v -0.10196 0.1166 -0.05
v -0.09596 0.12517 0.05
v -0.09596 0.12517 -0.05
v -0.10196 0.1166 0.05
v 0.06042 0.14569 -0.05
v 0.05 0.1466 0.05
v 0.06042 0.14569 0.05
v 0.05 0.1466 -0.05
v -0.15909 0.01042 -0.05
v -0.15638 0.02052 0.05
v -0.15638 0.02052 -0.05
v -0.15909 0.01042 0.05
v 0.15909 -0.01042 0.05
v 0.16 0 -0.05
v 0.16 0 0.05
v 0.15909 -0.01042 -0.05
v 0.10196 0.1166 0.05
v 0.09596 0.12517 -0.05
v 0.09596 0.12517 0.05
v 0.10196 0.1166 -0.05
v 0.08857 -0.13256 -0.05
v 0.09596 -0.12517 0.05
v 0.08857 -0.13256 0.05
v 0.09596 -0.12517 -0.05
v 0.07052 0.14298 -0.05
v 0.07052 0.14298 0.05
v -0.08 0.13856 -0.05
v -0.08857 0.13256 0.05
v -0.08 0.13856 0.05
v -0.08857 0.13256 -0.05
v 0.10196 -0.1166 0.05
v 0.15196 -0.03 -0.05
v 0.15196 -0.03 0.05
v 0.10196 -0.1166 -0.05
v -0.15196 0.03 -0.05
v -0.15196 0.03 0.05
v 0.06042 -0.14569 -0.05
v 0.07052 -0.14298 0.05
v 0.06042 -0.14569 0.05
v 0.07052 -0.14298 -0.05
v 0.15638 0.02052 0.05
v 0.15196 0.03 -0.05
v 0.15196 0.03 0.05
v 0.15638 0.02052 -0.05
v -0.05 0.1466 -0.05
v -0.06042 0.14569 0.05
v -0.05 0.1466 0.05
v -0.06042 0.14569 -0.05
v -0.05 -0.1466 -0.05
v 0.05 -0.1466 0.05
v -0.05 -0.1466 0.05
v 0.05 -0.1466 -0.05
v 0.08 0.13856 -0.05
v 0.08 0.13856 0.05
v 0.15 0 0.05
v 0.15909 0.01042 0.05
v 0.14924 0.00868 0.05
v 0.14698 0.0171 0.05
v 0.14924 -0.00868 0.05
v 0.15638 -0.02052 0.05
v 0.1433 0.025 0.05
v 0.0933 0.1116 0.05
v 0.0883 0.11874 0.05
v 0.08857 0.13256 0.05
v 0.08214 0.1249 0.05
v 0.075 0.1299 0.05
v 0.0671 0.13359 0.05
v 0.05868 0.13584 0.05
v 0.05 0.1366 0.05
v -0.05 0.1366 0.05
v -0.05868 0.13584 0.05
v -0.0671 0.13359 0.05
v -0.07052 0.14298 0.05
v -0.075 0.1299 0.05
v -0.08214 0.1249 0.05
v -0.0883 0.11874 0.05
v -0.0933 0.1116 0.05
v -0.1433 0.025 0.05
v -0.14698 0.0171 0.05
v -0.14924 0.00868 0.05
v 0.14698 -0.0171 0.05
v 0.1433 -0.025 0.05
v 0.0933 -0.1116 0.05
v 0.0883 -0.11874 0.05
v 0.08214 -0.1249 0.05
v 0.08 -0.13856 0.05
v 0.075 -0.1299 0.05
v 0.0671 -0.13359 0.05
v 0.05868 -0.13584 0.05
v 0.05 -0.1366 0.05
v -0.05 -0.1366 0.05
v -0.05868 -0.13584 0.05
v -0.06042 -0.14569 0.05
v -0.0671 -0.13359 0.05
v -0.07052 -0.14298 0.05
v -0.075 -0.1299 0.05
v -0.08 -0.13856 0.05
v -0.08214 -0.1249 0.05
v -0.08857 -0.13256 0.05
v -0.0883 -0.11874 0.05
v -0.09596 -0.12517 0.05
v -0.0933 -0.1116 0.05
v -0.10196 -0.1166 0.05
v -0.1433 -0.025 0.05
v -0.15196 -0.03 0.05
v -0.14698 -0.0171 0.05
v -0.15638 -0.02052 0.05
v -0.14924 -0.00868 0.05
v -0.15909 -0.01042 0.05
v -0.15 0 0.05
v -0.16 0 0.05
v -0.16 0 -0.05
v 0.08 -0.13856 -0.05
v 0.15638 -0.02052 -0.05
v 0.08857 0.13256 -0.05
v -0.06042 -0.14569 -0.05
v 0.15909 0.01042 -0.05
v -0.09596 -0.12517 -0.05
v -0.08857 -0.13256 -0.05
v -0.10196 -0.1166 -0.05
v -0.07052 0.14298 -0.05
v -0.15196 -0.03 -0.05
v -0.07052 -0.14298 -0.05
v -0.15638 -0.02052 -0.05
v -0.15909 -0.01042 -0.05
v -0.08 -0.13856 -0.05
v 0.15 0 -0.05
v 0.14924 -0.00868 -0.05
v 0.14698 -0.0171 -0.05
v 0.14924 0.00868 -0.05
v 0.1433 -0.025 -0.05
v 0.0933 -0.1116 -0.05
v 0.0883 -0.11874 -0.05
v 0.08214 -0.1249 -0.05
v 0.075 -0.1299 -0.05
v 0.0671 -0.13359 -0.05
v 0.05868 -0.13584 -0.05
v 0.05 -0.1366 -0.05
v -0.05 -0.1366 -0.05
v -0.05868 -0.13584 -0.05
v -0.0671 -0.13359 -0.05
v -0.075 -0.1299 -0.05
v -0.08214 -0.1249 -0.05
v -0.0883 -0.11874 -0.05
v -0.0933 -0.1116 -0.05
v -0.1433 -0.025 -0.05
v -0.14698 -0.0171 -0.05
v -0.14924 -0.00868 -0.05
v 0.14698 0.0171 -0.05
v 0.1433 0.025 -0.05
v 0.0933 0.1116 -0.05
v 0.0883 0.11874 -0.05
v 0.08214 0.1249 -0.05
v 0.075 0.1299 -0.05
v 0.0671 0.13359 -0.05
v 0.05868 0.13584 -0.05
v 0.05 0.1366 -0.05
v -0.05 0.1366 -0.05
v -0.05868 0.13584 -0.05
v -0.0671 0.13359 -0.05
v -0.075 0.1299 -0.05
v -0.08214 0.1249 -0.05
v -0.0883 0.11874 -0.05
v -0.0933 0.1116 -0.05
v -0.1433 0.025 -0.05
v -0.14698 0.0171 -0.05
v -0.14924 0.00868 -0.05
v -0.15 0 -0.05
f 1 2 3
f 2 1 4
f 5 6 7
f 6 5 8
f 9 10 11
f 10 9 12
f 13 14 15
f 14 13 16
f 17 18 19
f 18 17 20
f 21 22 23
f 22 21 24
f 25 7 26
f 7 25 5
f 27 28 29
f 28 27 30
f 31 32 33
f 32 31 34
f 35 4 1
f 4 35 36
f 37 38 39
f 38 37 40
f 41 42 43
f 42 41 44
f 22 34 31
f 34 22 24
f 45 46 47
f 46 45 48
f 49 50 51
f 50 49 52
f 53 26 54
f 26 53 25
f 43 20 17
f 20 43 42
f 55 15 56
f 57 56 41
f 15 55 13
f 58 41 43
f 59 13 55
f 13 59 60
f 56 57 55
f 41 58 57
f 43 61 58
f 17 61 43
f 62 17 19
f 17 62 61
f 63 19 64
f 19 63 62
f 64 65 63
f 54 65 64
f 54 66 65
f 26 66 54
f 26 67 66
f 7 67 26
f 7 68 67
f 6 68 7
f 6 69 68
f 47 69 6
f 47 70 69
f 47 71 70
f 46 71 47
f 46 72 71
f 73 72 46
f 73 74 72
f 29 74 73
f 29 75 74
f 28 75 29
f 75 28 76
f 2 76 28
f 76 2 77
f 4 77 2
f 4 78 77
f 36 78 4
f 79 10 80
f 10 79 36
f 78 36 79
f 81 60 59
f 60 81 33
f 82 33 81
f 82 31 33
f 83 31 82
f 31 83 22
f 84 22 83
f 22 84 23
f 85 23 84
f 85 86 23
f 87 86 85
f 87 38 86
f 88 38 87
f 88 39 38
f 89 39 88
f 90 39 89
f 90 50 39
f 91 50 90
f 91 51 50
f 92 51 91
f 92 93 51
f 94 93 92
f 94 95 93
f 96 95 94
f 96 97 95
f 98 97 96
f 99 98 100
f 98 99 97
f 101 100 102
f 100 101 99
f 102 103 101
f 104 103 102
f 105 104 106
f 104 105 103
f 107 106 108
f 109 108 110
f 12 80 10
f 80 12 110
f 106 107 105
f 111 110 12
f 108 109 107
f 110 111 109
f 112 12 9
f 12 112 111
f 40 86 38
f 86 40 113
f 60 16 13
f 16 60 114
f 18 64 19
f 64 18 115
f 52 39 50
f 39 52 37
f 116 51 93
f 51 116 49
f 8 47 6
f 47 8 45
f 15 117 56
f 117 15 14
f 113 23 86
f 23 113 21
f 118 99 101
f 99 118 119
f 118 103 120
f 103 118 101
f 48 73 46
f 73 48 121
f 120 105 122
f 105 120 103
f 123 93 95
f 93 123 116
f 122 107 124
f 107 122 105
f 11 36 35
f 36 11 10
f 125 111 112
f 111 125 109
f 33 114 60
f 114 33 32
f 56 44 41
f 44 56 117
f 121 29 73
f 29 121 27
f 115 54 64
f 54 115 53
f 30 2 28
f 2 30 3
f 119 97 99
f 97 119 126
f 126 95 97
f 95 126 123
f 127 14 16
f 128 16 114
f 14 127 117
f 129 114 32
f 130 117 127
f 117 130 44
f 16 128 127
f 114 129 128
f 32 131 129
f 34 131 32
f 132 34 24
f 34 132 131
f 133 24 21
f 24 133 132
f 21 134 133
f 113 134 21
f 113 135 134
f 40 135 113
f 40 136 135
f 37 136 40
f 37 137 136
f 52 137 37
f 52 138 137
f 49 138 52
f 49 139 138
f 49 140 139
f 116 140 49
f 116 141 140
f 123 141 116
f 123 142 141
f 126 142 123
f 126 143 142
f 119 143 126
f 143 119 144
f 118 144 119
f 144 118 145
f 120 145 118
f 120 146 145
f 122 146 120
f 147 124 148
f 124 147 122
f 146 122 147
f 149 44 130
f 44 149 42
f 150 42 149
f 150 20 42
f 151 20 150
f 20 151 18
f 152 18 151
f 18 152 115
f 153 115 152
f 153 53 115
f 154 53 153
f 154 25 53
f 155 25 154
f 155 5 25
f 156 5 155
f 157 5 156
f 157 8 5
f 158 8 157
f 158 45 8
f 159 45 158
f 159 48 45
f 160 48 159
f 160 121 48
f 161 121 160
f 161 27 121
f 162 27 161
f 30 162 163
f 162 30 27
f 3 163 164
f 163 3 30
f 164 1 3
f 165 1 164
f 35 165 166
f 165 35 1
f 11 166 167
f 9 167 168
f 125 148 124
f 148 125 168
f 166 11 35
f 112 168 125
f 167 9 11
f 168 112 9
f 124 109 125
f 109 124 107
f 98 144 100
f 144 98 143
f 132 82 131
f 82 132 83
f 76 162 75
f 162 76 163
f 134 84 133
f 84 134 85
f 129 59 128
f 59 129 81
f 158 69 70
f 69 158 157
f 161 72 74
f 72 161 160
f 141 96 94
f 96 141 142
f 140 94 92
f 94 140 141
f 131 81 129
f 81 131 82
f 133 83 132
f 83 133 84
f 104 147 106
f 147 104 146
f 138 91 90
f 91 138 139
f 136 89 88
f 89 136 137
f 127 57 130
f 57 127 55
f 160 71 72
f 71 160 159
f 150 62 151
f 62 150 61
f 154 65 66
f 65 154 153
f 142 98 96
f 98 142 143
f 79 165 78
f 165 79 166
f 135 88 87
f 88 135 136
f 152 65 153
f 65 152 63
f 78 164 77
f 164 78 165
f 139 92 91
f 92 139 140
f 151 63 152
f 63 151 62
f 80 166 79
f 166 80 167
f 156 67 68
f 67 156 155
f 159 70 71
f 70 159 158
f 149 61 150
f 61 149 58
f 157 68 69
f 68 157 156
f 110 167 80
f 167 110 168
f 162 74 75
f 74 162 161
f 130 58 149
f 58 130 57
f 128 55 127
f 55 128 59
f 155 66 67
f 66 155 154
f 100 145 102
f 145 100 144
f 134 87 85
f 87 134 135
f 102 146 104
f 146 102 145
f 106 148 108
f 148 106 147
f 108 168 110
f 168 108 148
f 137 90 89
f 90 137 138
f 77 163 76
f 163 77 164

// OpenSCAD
use <lib.scad>

module stick() {
	cyl(0.05, 0.05, 0.6);
}

module pin() {
	cyl(0.01, 0.01, 0.6);
}

module sticks() {
	union() {
		stick();
		for (i = [0:1:6])
			rotate([0,0,i*60]) translate([0.095,0,0]) stick();
	}
}

module pins() {
	translate([0,0,0.025]) union() {
		pin();
		for (i = [0:1:6])
			rotate([0,0,i*60]) translate([0.1,0,0]) pin();
	}
}

module strap() {
	difference() {
		hull() {
			for (i = [0:1:6])
				rotate([0,0,i*60]) translate([0.1,0,0]) cyl(0.06,0.06,0.1);
		}
		hull() {
			for (i = [0:1:6])
				rotate([0,0,i*60]) translate([0.1,0,0]) cyl(0.05,0.05,0.11);
		}
	}
}

//sticks($fn=12);
//pins($fn=12);
strap($fn=36);
